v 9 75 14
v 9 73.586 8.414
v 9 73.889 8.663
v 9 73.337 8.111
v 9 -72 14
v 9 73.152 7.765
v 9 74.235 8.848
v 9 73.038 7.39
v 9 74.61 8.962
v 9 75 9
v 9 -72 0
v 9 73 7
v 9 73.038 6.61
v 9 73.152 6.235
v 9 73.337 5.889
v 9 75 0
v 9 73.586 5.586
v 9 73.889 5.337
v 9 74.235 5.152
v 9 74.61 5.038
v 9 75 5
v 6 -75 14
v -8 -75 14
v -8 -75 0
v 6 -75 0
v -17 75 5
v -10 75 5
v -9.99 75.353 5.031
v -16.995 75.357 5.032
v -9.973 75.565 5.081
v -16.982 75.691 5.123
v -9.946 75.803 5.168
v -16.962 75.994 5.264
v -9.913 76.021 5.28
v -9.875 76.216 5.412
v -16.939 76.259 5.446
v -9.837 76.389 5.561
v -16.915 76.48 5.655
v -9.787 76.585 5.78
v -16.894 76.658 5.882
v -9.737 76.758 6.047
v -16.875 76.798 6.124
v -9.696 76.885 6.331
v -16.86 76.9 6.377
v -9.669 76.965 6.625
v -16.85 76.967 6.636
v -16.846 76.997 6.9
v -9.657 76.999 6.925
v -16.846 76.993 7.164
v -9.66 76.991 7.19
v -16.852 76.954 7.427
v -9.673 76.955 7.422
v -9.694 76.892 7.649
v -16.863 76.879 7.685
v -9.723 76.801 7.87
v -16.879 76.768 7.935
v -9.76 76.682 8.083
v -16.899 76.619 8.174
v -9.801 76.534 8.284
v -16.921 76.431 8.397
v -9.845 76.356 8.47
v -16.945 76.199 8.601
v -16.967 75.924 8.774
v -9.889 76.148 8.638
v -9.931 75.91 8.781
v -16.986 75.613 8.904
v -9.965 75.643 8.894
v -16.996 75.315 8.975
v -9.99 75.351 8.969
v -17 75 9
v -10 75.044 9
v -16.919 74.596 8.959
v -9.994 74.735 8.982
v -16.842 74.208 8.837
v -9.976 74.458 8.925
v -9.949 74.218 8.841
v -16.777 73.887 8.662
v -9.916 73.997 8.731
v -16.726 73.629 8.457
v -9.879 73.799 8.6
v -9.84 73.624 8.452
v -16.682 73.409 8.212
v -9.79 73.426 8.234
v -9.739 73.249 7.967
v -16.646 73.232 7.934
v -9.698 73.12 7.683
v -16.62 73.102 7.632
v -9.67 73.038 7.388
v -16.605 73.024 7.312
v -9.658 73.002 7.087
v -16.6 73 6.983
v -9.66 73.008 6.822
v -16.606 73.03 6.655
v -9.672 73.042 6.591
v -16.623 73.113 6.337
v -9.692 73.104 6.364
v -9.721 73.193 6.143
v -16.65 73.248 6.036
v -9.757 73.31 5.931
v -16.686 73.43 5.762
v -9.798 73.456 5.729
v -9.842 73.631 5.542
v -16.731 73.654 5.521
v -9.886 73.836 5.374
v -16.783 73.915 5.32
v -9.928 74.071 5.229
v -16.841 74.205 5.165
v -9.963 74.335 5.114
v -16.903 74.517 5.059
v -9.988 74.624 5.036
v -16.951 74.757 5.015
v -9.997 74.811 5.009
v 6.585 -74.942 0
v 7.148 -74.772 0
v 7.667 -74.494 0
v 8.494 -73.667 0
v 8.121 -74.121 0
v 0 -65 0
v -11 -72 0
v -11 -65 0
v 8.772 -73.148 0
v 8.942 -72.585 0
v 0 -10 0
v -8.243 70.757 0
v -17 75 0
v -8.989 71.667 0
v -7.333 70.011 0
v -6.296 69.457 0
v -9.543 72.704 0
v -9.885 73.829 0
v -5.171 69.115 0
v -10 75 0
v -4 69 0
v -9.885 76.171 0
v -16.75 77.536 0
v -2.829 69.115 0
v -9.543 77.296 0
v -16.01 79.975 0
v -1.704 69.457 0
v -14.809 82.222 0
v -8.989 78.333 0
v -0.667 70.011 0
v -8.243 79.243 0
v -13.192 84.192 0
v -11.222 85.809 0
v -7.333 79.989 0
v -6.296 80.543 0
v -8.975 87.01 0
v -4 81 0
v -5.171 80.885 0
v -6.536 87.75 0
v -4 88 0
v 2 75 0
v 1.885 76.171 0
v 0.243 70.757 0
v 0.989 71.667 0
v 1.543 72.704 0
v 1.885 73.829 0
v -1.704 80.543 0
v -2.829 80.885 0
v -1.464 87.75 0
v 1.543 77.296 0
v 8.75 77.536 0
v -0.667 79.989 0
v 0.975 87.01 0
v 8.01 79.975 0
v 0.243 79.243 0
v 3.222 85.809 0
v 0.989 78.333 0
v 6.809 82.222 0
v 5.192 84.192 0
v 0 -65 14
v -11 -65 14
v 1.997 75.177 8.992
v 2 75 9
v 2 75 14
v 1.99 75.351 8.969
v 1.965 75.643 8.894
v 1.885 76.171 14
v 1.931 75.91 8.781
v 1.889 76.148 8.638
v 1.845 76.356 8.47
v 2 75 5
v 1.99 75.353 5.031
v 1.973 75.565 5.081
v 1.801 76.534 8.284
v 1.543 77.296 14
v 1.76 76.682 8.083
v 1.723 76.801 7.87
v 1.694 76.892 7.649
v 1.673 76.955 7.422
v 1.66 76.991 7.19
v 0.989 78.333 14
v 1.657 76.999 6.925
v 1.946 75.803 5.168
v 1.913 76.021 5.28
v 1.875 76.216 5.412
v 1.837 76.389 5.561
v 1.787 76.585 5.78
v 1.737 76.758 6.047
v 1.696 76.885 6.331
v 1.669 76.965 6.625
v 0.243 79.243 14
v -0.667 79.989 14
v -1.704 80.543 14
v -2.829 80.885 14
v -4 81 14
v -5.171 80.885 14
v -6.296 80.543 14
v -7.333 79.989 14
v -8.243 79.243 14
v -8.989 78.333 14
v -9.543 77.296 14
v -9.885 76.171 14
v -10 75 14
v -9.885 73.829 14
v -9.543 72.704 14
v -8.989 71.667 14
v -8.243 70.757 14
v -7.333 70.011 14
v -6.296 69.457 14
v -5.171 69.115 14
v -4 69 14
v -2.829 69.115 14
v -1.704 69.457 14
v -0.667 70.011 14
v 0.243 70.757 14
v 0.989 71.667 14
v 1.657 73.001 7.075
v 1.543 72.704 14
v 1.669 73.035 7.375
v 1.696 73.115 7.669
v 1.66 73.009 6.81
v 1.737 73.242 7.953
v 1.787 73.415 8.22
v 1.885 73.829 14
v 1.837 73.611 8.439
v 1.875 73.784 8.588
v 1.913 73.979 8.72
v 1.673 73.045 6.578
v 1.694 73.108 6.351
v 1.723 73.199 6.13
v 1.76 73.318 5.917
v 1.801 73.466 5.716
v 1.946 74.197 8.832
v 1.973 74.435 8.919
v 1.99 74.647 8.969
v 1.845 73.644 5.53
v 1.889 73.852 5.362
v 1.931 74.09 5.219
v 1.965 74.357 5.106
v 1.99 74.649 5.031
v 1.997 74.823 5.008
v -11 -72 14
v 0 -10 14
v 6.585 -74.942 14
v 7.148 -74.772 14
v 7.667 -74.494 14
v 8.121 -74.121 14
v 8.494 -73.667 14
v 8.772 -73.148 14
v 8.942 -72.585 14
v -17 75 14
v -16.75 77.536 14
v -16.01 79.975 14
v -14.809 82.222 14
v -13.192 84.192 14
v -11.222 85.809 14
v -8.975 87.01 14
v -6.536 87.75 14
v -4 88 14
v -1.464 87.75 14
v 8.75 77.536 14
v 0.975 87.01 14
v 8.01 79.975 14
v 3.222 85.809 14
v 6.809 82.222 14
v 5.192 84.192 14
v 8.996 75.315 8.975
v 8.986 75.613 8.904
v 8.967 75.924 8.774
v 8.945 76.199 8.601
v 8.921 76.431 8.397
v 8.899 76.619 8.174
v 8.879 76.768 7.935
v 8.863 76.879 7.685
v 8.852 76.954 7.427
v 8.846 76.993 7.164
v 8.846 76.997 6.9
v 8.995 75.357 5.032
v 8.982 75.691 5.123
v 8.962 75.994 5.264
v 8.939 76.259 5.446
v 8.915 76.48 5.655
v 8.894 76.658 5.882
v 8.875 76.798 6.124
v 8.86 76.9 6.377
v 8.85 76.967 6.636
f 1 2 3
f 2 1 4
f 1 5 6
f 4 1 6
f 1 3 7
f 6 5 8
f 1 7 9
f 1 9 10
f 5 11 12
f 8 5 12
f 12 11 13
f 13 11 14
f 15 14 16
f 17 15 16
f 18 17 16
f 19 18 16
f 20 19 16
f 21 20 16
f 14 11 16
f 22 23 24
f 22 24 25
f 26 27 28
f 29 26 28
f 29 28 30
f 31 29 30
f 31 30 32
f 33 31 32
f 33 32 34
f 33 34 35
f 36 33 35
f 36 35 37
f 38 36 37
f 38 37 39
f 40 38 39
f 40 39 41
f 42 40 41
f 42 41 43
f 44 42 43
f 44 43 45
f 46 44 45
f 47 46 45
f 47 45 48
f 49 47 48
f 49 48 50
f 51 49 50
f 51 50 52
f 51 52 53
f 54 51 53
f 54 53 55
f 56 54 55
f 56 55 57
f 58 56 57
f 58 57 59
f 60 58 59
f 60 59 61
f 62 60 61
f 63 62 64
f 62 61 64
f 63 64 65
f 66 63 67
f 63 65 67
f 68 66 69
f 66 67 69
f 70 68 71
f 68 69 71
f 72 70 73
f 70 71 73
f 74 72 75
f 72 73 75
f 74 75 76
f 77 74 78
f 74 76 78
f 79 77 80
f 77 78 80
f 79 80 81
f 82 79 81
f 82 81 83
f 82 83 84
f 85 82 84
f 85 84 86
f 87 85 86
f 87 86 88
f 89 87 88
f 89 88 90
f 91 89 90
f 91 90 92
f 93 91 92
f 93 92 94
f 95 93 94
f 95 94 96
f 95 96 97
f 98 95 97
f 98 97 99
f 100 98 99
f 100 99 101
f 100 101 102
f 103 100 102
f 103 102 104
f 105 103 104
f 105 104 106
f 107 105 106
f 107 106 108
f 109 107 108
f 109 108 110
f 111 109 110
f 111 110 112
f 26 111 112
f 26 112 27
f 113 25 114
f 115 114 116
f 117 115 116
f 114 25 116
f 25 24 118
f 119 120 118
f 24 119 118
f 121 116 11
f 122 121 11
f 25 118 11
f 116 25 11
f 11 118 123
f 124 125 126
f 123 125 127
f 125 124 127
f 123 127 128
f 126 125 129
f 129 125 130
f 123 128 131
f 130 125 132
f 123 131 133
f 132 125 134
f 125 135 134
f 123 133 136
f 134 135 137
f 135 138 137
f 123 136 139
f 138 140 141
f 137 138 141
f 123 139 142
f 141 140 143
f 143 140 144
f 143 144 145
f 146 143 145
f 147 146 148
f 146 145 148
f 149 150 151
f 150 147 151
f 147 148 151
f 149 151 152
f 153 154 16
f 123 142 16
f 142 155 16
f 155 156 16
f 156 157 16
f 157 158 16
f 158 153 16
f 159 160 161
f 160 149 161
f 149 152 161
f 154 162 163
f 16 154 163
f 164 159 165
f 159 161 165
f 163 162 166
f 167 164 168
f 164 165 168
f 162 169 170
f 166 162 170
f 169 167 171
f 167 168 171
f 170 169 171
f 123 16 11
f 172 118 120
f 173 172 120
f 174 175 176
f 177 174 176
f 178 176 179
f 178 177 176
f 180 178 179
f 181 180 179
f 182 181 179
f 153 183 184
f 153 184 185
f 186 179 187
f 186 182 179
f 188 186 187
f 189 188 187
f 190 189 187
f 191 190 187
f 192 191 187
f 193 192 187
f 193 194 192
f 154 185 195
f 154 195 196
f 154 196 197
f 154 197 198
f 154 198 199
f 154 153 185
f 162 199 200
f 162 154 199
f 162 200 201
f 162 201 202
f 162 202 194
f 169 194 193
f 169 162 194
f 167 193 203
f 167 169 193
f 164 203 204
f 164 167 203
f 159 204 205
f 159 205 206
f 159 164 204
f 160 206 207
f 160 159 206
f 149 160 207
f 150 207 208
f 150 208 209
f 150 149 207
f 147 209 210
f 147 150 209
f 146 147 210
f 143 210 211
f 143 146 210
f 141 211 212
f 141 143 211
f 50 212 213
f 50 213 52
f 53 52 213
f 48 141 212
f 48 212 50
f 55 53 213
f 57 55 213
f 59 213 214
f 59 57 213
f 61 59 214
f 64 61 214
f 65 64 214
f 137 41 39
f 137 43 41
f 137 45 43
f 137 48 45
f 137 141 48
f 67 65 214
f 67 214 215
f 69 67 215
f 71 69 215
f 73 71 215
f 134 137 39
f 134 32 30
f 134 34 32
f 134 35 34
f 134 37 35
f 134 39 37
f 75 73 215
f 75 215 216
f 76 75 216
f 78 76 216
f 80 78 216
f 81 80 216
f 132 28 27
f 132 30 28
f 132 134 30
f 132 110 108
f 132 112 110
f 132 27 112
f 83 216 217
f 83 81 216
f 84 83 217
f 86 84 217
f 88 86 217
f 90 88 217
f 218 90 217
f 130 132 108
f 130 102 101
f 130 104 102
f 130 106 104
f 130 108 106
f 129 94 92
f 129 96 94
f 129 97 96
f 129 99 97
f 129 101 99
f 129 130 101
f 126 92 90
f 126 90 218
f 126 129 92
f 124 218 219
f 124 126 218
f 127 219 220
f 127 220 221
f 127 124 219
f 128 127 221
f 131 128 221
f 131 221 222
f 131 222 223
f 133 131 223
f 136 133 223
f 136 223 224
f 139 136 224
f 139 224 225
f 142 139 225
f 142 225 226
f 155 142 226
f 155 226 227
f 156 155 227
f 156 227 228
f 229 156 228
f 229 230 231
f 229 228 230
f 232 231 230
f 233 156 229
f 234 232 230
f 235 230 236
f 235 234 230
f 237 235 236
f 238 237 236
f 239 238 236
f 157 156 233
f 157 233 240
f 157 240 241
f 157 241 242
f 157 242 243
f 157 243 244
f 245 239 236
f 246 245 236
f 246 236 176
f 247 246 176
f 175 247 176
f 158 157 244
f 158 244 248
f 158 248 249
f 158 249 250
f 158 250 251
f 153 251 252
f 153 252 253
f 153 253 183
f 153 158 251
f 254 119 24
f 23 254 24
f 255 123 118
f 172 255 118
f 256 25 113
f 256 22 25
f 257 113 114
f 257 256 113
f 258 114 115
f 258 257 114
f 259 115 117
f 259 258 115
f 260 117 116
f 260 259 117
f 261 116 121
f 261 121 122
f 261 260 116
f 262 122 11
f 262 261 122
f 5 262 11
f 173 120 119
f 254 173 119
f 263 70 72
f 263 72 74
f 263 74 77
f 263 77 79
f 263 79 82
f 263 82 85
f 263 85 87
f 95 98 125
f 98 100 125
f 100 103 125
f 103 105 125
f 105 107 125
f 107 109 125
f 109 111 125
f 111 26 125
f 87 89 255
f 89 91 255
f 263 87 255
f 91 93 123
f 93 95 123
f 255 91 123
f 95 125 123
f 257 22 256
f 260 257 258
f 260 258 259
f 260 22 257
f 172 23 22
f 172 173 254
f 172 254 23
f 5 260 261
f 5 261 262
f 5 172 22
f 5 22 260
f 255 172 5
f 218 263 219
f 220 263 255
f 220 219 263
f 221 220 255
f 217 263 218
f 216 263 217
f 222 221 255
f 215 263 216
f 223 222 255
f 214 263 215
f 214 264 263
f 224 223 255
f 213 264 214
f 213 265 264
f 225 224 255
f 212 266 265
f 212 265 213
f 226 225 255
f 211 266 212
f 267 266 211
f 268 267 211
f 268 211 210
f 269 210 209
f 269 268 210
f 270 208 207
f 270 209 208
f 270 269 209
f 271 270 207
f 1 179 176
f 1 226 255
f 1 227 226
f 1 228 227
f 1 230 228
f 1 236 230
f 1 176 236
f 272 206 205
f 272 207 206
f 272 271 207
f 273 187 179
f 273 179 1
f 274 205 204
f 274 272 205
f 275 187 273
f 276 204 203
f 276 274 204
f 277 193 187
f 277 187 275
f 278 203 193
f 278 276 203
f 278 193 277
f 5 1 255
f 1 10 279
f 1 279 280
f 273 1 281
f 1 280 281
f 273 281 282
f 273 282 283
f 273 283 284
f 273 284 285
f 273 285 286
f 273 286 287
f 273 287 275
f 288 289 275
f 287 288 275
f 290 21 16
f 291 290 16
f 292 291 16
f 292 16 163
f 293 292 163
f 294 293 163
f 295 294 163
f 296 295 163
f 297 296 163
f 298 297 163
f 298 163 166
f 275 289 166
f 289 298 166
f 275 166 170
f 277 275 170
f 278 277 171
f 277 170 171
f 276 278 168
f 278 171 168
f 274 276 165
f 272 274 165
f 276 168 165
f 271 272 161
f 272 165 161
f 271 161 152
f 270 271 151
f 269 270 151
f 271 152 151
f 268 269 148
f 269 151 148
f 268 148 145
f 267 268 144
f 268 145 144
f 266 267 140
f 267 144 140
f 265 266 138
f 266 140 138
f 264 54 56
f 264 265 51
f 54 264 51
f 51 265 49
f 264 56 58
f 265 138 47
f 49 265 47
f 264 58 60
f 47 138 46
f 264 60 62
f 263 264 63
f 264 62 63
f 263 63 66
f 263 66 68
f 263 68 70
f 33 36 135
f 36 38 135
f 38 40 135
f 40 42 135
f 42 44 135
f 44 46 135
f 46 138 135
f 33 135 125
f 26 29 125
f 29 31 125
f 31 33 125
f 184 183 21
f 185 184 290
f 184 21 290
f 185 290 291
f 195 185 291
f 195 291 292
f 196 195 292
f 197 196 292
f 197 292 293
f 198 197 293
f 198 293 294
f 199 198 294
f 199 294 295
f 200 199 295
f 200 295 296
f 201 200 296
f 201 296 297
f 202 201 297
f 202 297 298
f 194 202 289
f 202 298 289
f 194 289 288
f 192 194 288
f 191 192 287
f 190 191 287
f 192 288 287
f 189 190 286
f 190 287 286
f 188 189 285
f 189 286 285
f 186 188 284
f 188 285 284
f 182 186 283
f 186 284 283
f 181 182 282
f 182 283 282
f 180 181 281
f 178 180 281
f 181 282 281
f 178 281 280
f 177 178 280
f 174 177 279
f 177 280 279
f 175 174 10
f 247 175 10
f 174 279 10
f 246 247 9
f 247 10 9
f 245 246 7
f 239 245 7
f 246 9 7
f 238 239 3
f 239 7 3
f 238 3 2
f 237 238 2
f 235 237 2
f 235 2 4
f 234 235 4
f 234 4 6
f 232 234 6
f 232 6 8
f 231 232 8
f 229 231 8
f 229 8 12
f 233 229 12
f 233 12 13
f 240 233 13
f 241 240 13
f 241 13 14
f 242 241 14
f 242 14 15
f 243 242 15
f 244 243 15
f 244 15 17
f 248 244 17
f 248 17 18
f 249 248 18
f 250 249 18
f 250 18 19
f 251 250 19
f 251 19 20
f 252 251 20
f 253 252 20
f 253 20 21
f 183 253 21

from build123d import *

# Parameters (mm, degrees)
SKETCH1_R           = 6
BOSS_EXTRUDE1_DEPTH = 14
SKETCH2_R           = 2
CUT_EXTRUDE1_DEPTH  = 93.822411087
FILLET1_R           = 3


with BuildPart() as part:
    # Sketch1 → Boss-Extrude1 (new body)
    with BuildSketch(Plane.XY):
        with BuildLine():
            Line((0, -65), (-11, -65))
            Line((-11, -65), (-11, -72))
            Line((-11, -72), (-8, -75))
            Line((-8, -75), (9, -75))
            Line((9, -75), (9, 75))
            ThreePointArc((9, 75), (-4, 88), (-17, 75))
            Line((-17, 75), (0, -10))
            Line((0, -10), (0, -65))
        make_face()
        with Locations((-4, 75)):
            Circle(SKETCH1_R, mode=Mode.SUBTRACT)
    extrude(amount=BOSS_EXTRUDE1_DEPTH)

    # Sketch2 → Cut-Extrude1 (cut, through all)
    with BuildSketch(Plane(origin=(9, 0, 0), x_dir=(0, 0, -1), z_dir=(1, 0, 0))):
        with Locations((-7, 75)):
            Circle(SKETCH2_R)
    extrude(amount=-CUT_EXTRUDE1_DEPTH, mode=Mode.SUBTRACT)

    # Fillet1
    fillet1_edges = [part.edges().sort_by_distance(p)[0] for p in [
        (9, -75, 7),
    ]]
    fillet(fillet1_edges, radius=FILLET1_R)


solid = part.part
